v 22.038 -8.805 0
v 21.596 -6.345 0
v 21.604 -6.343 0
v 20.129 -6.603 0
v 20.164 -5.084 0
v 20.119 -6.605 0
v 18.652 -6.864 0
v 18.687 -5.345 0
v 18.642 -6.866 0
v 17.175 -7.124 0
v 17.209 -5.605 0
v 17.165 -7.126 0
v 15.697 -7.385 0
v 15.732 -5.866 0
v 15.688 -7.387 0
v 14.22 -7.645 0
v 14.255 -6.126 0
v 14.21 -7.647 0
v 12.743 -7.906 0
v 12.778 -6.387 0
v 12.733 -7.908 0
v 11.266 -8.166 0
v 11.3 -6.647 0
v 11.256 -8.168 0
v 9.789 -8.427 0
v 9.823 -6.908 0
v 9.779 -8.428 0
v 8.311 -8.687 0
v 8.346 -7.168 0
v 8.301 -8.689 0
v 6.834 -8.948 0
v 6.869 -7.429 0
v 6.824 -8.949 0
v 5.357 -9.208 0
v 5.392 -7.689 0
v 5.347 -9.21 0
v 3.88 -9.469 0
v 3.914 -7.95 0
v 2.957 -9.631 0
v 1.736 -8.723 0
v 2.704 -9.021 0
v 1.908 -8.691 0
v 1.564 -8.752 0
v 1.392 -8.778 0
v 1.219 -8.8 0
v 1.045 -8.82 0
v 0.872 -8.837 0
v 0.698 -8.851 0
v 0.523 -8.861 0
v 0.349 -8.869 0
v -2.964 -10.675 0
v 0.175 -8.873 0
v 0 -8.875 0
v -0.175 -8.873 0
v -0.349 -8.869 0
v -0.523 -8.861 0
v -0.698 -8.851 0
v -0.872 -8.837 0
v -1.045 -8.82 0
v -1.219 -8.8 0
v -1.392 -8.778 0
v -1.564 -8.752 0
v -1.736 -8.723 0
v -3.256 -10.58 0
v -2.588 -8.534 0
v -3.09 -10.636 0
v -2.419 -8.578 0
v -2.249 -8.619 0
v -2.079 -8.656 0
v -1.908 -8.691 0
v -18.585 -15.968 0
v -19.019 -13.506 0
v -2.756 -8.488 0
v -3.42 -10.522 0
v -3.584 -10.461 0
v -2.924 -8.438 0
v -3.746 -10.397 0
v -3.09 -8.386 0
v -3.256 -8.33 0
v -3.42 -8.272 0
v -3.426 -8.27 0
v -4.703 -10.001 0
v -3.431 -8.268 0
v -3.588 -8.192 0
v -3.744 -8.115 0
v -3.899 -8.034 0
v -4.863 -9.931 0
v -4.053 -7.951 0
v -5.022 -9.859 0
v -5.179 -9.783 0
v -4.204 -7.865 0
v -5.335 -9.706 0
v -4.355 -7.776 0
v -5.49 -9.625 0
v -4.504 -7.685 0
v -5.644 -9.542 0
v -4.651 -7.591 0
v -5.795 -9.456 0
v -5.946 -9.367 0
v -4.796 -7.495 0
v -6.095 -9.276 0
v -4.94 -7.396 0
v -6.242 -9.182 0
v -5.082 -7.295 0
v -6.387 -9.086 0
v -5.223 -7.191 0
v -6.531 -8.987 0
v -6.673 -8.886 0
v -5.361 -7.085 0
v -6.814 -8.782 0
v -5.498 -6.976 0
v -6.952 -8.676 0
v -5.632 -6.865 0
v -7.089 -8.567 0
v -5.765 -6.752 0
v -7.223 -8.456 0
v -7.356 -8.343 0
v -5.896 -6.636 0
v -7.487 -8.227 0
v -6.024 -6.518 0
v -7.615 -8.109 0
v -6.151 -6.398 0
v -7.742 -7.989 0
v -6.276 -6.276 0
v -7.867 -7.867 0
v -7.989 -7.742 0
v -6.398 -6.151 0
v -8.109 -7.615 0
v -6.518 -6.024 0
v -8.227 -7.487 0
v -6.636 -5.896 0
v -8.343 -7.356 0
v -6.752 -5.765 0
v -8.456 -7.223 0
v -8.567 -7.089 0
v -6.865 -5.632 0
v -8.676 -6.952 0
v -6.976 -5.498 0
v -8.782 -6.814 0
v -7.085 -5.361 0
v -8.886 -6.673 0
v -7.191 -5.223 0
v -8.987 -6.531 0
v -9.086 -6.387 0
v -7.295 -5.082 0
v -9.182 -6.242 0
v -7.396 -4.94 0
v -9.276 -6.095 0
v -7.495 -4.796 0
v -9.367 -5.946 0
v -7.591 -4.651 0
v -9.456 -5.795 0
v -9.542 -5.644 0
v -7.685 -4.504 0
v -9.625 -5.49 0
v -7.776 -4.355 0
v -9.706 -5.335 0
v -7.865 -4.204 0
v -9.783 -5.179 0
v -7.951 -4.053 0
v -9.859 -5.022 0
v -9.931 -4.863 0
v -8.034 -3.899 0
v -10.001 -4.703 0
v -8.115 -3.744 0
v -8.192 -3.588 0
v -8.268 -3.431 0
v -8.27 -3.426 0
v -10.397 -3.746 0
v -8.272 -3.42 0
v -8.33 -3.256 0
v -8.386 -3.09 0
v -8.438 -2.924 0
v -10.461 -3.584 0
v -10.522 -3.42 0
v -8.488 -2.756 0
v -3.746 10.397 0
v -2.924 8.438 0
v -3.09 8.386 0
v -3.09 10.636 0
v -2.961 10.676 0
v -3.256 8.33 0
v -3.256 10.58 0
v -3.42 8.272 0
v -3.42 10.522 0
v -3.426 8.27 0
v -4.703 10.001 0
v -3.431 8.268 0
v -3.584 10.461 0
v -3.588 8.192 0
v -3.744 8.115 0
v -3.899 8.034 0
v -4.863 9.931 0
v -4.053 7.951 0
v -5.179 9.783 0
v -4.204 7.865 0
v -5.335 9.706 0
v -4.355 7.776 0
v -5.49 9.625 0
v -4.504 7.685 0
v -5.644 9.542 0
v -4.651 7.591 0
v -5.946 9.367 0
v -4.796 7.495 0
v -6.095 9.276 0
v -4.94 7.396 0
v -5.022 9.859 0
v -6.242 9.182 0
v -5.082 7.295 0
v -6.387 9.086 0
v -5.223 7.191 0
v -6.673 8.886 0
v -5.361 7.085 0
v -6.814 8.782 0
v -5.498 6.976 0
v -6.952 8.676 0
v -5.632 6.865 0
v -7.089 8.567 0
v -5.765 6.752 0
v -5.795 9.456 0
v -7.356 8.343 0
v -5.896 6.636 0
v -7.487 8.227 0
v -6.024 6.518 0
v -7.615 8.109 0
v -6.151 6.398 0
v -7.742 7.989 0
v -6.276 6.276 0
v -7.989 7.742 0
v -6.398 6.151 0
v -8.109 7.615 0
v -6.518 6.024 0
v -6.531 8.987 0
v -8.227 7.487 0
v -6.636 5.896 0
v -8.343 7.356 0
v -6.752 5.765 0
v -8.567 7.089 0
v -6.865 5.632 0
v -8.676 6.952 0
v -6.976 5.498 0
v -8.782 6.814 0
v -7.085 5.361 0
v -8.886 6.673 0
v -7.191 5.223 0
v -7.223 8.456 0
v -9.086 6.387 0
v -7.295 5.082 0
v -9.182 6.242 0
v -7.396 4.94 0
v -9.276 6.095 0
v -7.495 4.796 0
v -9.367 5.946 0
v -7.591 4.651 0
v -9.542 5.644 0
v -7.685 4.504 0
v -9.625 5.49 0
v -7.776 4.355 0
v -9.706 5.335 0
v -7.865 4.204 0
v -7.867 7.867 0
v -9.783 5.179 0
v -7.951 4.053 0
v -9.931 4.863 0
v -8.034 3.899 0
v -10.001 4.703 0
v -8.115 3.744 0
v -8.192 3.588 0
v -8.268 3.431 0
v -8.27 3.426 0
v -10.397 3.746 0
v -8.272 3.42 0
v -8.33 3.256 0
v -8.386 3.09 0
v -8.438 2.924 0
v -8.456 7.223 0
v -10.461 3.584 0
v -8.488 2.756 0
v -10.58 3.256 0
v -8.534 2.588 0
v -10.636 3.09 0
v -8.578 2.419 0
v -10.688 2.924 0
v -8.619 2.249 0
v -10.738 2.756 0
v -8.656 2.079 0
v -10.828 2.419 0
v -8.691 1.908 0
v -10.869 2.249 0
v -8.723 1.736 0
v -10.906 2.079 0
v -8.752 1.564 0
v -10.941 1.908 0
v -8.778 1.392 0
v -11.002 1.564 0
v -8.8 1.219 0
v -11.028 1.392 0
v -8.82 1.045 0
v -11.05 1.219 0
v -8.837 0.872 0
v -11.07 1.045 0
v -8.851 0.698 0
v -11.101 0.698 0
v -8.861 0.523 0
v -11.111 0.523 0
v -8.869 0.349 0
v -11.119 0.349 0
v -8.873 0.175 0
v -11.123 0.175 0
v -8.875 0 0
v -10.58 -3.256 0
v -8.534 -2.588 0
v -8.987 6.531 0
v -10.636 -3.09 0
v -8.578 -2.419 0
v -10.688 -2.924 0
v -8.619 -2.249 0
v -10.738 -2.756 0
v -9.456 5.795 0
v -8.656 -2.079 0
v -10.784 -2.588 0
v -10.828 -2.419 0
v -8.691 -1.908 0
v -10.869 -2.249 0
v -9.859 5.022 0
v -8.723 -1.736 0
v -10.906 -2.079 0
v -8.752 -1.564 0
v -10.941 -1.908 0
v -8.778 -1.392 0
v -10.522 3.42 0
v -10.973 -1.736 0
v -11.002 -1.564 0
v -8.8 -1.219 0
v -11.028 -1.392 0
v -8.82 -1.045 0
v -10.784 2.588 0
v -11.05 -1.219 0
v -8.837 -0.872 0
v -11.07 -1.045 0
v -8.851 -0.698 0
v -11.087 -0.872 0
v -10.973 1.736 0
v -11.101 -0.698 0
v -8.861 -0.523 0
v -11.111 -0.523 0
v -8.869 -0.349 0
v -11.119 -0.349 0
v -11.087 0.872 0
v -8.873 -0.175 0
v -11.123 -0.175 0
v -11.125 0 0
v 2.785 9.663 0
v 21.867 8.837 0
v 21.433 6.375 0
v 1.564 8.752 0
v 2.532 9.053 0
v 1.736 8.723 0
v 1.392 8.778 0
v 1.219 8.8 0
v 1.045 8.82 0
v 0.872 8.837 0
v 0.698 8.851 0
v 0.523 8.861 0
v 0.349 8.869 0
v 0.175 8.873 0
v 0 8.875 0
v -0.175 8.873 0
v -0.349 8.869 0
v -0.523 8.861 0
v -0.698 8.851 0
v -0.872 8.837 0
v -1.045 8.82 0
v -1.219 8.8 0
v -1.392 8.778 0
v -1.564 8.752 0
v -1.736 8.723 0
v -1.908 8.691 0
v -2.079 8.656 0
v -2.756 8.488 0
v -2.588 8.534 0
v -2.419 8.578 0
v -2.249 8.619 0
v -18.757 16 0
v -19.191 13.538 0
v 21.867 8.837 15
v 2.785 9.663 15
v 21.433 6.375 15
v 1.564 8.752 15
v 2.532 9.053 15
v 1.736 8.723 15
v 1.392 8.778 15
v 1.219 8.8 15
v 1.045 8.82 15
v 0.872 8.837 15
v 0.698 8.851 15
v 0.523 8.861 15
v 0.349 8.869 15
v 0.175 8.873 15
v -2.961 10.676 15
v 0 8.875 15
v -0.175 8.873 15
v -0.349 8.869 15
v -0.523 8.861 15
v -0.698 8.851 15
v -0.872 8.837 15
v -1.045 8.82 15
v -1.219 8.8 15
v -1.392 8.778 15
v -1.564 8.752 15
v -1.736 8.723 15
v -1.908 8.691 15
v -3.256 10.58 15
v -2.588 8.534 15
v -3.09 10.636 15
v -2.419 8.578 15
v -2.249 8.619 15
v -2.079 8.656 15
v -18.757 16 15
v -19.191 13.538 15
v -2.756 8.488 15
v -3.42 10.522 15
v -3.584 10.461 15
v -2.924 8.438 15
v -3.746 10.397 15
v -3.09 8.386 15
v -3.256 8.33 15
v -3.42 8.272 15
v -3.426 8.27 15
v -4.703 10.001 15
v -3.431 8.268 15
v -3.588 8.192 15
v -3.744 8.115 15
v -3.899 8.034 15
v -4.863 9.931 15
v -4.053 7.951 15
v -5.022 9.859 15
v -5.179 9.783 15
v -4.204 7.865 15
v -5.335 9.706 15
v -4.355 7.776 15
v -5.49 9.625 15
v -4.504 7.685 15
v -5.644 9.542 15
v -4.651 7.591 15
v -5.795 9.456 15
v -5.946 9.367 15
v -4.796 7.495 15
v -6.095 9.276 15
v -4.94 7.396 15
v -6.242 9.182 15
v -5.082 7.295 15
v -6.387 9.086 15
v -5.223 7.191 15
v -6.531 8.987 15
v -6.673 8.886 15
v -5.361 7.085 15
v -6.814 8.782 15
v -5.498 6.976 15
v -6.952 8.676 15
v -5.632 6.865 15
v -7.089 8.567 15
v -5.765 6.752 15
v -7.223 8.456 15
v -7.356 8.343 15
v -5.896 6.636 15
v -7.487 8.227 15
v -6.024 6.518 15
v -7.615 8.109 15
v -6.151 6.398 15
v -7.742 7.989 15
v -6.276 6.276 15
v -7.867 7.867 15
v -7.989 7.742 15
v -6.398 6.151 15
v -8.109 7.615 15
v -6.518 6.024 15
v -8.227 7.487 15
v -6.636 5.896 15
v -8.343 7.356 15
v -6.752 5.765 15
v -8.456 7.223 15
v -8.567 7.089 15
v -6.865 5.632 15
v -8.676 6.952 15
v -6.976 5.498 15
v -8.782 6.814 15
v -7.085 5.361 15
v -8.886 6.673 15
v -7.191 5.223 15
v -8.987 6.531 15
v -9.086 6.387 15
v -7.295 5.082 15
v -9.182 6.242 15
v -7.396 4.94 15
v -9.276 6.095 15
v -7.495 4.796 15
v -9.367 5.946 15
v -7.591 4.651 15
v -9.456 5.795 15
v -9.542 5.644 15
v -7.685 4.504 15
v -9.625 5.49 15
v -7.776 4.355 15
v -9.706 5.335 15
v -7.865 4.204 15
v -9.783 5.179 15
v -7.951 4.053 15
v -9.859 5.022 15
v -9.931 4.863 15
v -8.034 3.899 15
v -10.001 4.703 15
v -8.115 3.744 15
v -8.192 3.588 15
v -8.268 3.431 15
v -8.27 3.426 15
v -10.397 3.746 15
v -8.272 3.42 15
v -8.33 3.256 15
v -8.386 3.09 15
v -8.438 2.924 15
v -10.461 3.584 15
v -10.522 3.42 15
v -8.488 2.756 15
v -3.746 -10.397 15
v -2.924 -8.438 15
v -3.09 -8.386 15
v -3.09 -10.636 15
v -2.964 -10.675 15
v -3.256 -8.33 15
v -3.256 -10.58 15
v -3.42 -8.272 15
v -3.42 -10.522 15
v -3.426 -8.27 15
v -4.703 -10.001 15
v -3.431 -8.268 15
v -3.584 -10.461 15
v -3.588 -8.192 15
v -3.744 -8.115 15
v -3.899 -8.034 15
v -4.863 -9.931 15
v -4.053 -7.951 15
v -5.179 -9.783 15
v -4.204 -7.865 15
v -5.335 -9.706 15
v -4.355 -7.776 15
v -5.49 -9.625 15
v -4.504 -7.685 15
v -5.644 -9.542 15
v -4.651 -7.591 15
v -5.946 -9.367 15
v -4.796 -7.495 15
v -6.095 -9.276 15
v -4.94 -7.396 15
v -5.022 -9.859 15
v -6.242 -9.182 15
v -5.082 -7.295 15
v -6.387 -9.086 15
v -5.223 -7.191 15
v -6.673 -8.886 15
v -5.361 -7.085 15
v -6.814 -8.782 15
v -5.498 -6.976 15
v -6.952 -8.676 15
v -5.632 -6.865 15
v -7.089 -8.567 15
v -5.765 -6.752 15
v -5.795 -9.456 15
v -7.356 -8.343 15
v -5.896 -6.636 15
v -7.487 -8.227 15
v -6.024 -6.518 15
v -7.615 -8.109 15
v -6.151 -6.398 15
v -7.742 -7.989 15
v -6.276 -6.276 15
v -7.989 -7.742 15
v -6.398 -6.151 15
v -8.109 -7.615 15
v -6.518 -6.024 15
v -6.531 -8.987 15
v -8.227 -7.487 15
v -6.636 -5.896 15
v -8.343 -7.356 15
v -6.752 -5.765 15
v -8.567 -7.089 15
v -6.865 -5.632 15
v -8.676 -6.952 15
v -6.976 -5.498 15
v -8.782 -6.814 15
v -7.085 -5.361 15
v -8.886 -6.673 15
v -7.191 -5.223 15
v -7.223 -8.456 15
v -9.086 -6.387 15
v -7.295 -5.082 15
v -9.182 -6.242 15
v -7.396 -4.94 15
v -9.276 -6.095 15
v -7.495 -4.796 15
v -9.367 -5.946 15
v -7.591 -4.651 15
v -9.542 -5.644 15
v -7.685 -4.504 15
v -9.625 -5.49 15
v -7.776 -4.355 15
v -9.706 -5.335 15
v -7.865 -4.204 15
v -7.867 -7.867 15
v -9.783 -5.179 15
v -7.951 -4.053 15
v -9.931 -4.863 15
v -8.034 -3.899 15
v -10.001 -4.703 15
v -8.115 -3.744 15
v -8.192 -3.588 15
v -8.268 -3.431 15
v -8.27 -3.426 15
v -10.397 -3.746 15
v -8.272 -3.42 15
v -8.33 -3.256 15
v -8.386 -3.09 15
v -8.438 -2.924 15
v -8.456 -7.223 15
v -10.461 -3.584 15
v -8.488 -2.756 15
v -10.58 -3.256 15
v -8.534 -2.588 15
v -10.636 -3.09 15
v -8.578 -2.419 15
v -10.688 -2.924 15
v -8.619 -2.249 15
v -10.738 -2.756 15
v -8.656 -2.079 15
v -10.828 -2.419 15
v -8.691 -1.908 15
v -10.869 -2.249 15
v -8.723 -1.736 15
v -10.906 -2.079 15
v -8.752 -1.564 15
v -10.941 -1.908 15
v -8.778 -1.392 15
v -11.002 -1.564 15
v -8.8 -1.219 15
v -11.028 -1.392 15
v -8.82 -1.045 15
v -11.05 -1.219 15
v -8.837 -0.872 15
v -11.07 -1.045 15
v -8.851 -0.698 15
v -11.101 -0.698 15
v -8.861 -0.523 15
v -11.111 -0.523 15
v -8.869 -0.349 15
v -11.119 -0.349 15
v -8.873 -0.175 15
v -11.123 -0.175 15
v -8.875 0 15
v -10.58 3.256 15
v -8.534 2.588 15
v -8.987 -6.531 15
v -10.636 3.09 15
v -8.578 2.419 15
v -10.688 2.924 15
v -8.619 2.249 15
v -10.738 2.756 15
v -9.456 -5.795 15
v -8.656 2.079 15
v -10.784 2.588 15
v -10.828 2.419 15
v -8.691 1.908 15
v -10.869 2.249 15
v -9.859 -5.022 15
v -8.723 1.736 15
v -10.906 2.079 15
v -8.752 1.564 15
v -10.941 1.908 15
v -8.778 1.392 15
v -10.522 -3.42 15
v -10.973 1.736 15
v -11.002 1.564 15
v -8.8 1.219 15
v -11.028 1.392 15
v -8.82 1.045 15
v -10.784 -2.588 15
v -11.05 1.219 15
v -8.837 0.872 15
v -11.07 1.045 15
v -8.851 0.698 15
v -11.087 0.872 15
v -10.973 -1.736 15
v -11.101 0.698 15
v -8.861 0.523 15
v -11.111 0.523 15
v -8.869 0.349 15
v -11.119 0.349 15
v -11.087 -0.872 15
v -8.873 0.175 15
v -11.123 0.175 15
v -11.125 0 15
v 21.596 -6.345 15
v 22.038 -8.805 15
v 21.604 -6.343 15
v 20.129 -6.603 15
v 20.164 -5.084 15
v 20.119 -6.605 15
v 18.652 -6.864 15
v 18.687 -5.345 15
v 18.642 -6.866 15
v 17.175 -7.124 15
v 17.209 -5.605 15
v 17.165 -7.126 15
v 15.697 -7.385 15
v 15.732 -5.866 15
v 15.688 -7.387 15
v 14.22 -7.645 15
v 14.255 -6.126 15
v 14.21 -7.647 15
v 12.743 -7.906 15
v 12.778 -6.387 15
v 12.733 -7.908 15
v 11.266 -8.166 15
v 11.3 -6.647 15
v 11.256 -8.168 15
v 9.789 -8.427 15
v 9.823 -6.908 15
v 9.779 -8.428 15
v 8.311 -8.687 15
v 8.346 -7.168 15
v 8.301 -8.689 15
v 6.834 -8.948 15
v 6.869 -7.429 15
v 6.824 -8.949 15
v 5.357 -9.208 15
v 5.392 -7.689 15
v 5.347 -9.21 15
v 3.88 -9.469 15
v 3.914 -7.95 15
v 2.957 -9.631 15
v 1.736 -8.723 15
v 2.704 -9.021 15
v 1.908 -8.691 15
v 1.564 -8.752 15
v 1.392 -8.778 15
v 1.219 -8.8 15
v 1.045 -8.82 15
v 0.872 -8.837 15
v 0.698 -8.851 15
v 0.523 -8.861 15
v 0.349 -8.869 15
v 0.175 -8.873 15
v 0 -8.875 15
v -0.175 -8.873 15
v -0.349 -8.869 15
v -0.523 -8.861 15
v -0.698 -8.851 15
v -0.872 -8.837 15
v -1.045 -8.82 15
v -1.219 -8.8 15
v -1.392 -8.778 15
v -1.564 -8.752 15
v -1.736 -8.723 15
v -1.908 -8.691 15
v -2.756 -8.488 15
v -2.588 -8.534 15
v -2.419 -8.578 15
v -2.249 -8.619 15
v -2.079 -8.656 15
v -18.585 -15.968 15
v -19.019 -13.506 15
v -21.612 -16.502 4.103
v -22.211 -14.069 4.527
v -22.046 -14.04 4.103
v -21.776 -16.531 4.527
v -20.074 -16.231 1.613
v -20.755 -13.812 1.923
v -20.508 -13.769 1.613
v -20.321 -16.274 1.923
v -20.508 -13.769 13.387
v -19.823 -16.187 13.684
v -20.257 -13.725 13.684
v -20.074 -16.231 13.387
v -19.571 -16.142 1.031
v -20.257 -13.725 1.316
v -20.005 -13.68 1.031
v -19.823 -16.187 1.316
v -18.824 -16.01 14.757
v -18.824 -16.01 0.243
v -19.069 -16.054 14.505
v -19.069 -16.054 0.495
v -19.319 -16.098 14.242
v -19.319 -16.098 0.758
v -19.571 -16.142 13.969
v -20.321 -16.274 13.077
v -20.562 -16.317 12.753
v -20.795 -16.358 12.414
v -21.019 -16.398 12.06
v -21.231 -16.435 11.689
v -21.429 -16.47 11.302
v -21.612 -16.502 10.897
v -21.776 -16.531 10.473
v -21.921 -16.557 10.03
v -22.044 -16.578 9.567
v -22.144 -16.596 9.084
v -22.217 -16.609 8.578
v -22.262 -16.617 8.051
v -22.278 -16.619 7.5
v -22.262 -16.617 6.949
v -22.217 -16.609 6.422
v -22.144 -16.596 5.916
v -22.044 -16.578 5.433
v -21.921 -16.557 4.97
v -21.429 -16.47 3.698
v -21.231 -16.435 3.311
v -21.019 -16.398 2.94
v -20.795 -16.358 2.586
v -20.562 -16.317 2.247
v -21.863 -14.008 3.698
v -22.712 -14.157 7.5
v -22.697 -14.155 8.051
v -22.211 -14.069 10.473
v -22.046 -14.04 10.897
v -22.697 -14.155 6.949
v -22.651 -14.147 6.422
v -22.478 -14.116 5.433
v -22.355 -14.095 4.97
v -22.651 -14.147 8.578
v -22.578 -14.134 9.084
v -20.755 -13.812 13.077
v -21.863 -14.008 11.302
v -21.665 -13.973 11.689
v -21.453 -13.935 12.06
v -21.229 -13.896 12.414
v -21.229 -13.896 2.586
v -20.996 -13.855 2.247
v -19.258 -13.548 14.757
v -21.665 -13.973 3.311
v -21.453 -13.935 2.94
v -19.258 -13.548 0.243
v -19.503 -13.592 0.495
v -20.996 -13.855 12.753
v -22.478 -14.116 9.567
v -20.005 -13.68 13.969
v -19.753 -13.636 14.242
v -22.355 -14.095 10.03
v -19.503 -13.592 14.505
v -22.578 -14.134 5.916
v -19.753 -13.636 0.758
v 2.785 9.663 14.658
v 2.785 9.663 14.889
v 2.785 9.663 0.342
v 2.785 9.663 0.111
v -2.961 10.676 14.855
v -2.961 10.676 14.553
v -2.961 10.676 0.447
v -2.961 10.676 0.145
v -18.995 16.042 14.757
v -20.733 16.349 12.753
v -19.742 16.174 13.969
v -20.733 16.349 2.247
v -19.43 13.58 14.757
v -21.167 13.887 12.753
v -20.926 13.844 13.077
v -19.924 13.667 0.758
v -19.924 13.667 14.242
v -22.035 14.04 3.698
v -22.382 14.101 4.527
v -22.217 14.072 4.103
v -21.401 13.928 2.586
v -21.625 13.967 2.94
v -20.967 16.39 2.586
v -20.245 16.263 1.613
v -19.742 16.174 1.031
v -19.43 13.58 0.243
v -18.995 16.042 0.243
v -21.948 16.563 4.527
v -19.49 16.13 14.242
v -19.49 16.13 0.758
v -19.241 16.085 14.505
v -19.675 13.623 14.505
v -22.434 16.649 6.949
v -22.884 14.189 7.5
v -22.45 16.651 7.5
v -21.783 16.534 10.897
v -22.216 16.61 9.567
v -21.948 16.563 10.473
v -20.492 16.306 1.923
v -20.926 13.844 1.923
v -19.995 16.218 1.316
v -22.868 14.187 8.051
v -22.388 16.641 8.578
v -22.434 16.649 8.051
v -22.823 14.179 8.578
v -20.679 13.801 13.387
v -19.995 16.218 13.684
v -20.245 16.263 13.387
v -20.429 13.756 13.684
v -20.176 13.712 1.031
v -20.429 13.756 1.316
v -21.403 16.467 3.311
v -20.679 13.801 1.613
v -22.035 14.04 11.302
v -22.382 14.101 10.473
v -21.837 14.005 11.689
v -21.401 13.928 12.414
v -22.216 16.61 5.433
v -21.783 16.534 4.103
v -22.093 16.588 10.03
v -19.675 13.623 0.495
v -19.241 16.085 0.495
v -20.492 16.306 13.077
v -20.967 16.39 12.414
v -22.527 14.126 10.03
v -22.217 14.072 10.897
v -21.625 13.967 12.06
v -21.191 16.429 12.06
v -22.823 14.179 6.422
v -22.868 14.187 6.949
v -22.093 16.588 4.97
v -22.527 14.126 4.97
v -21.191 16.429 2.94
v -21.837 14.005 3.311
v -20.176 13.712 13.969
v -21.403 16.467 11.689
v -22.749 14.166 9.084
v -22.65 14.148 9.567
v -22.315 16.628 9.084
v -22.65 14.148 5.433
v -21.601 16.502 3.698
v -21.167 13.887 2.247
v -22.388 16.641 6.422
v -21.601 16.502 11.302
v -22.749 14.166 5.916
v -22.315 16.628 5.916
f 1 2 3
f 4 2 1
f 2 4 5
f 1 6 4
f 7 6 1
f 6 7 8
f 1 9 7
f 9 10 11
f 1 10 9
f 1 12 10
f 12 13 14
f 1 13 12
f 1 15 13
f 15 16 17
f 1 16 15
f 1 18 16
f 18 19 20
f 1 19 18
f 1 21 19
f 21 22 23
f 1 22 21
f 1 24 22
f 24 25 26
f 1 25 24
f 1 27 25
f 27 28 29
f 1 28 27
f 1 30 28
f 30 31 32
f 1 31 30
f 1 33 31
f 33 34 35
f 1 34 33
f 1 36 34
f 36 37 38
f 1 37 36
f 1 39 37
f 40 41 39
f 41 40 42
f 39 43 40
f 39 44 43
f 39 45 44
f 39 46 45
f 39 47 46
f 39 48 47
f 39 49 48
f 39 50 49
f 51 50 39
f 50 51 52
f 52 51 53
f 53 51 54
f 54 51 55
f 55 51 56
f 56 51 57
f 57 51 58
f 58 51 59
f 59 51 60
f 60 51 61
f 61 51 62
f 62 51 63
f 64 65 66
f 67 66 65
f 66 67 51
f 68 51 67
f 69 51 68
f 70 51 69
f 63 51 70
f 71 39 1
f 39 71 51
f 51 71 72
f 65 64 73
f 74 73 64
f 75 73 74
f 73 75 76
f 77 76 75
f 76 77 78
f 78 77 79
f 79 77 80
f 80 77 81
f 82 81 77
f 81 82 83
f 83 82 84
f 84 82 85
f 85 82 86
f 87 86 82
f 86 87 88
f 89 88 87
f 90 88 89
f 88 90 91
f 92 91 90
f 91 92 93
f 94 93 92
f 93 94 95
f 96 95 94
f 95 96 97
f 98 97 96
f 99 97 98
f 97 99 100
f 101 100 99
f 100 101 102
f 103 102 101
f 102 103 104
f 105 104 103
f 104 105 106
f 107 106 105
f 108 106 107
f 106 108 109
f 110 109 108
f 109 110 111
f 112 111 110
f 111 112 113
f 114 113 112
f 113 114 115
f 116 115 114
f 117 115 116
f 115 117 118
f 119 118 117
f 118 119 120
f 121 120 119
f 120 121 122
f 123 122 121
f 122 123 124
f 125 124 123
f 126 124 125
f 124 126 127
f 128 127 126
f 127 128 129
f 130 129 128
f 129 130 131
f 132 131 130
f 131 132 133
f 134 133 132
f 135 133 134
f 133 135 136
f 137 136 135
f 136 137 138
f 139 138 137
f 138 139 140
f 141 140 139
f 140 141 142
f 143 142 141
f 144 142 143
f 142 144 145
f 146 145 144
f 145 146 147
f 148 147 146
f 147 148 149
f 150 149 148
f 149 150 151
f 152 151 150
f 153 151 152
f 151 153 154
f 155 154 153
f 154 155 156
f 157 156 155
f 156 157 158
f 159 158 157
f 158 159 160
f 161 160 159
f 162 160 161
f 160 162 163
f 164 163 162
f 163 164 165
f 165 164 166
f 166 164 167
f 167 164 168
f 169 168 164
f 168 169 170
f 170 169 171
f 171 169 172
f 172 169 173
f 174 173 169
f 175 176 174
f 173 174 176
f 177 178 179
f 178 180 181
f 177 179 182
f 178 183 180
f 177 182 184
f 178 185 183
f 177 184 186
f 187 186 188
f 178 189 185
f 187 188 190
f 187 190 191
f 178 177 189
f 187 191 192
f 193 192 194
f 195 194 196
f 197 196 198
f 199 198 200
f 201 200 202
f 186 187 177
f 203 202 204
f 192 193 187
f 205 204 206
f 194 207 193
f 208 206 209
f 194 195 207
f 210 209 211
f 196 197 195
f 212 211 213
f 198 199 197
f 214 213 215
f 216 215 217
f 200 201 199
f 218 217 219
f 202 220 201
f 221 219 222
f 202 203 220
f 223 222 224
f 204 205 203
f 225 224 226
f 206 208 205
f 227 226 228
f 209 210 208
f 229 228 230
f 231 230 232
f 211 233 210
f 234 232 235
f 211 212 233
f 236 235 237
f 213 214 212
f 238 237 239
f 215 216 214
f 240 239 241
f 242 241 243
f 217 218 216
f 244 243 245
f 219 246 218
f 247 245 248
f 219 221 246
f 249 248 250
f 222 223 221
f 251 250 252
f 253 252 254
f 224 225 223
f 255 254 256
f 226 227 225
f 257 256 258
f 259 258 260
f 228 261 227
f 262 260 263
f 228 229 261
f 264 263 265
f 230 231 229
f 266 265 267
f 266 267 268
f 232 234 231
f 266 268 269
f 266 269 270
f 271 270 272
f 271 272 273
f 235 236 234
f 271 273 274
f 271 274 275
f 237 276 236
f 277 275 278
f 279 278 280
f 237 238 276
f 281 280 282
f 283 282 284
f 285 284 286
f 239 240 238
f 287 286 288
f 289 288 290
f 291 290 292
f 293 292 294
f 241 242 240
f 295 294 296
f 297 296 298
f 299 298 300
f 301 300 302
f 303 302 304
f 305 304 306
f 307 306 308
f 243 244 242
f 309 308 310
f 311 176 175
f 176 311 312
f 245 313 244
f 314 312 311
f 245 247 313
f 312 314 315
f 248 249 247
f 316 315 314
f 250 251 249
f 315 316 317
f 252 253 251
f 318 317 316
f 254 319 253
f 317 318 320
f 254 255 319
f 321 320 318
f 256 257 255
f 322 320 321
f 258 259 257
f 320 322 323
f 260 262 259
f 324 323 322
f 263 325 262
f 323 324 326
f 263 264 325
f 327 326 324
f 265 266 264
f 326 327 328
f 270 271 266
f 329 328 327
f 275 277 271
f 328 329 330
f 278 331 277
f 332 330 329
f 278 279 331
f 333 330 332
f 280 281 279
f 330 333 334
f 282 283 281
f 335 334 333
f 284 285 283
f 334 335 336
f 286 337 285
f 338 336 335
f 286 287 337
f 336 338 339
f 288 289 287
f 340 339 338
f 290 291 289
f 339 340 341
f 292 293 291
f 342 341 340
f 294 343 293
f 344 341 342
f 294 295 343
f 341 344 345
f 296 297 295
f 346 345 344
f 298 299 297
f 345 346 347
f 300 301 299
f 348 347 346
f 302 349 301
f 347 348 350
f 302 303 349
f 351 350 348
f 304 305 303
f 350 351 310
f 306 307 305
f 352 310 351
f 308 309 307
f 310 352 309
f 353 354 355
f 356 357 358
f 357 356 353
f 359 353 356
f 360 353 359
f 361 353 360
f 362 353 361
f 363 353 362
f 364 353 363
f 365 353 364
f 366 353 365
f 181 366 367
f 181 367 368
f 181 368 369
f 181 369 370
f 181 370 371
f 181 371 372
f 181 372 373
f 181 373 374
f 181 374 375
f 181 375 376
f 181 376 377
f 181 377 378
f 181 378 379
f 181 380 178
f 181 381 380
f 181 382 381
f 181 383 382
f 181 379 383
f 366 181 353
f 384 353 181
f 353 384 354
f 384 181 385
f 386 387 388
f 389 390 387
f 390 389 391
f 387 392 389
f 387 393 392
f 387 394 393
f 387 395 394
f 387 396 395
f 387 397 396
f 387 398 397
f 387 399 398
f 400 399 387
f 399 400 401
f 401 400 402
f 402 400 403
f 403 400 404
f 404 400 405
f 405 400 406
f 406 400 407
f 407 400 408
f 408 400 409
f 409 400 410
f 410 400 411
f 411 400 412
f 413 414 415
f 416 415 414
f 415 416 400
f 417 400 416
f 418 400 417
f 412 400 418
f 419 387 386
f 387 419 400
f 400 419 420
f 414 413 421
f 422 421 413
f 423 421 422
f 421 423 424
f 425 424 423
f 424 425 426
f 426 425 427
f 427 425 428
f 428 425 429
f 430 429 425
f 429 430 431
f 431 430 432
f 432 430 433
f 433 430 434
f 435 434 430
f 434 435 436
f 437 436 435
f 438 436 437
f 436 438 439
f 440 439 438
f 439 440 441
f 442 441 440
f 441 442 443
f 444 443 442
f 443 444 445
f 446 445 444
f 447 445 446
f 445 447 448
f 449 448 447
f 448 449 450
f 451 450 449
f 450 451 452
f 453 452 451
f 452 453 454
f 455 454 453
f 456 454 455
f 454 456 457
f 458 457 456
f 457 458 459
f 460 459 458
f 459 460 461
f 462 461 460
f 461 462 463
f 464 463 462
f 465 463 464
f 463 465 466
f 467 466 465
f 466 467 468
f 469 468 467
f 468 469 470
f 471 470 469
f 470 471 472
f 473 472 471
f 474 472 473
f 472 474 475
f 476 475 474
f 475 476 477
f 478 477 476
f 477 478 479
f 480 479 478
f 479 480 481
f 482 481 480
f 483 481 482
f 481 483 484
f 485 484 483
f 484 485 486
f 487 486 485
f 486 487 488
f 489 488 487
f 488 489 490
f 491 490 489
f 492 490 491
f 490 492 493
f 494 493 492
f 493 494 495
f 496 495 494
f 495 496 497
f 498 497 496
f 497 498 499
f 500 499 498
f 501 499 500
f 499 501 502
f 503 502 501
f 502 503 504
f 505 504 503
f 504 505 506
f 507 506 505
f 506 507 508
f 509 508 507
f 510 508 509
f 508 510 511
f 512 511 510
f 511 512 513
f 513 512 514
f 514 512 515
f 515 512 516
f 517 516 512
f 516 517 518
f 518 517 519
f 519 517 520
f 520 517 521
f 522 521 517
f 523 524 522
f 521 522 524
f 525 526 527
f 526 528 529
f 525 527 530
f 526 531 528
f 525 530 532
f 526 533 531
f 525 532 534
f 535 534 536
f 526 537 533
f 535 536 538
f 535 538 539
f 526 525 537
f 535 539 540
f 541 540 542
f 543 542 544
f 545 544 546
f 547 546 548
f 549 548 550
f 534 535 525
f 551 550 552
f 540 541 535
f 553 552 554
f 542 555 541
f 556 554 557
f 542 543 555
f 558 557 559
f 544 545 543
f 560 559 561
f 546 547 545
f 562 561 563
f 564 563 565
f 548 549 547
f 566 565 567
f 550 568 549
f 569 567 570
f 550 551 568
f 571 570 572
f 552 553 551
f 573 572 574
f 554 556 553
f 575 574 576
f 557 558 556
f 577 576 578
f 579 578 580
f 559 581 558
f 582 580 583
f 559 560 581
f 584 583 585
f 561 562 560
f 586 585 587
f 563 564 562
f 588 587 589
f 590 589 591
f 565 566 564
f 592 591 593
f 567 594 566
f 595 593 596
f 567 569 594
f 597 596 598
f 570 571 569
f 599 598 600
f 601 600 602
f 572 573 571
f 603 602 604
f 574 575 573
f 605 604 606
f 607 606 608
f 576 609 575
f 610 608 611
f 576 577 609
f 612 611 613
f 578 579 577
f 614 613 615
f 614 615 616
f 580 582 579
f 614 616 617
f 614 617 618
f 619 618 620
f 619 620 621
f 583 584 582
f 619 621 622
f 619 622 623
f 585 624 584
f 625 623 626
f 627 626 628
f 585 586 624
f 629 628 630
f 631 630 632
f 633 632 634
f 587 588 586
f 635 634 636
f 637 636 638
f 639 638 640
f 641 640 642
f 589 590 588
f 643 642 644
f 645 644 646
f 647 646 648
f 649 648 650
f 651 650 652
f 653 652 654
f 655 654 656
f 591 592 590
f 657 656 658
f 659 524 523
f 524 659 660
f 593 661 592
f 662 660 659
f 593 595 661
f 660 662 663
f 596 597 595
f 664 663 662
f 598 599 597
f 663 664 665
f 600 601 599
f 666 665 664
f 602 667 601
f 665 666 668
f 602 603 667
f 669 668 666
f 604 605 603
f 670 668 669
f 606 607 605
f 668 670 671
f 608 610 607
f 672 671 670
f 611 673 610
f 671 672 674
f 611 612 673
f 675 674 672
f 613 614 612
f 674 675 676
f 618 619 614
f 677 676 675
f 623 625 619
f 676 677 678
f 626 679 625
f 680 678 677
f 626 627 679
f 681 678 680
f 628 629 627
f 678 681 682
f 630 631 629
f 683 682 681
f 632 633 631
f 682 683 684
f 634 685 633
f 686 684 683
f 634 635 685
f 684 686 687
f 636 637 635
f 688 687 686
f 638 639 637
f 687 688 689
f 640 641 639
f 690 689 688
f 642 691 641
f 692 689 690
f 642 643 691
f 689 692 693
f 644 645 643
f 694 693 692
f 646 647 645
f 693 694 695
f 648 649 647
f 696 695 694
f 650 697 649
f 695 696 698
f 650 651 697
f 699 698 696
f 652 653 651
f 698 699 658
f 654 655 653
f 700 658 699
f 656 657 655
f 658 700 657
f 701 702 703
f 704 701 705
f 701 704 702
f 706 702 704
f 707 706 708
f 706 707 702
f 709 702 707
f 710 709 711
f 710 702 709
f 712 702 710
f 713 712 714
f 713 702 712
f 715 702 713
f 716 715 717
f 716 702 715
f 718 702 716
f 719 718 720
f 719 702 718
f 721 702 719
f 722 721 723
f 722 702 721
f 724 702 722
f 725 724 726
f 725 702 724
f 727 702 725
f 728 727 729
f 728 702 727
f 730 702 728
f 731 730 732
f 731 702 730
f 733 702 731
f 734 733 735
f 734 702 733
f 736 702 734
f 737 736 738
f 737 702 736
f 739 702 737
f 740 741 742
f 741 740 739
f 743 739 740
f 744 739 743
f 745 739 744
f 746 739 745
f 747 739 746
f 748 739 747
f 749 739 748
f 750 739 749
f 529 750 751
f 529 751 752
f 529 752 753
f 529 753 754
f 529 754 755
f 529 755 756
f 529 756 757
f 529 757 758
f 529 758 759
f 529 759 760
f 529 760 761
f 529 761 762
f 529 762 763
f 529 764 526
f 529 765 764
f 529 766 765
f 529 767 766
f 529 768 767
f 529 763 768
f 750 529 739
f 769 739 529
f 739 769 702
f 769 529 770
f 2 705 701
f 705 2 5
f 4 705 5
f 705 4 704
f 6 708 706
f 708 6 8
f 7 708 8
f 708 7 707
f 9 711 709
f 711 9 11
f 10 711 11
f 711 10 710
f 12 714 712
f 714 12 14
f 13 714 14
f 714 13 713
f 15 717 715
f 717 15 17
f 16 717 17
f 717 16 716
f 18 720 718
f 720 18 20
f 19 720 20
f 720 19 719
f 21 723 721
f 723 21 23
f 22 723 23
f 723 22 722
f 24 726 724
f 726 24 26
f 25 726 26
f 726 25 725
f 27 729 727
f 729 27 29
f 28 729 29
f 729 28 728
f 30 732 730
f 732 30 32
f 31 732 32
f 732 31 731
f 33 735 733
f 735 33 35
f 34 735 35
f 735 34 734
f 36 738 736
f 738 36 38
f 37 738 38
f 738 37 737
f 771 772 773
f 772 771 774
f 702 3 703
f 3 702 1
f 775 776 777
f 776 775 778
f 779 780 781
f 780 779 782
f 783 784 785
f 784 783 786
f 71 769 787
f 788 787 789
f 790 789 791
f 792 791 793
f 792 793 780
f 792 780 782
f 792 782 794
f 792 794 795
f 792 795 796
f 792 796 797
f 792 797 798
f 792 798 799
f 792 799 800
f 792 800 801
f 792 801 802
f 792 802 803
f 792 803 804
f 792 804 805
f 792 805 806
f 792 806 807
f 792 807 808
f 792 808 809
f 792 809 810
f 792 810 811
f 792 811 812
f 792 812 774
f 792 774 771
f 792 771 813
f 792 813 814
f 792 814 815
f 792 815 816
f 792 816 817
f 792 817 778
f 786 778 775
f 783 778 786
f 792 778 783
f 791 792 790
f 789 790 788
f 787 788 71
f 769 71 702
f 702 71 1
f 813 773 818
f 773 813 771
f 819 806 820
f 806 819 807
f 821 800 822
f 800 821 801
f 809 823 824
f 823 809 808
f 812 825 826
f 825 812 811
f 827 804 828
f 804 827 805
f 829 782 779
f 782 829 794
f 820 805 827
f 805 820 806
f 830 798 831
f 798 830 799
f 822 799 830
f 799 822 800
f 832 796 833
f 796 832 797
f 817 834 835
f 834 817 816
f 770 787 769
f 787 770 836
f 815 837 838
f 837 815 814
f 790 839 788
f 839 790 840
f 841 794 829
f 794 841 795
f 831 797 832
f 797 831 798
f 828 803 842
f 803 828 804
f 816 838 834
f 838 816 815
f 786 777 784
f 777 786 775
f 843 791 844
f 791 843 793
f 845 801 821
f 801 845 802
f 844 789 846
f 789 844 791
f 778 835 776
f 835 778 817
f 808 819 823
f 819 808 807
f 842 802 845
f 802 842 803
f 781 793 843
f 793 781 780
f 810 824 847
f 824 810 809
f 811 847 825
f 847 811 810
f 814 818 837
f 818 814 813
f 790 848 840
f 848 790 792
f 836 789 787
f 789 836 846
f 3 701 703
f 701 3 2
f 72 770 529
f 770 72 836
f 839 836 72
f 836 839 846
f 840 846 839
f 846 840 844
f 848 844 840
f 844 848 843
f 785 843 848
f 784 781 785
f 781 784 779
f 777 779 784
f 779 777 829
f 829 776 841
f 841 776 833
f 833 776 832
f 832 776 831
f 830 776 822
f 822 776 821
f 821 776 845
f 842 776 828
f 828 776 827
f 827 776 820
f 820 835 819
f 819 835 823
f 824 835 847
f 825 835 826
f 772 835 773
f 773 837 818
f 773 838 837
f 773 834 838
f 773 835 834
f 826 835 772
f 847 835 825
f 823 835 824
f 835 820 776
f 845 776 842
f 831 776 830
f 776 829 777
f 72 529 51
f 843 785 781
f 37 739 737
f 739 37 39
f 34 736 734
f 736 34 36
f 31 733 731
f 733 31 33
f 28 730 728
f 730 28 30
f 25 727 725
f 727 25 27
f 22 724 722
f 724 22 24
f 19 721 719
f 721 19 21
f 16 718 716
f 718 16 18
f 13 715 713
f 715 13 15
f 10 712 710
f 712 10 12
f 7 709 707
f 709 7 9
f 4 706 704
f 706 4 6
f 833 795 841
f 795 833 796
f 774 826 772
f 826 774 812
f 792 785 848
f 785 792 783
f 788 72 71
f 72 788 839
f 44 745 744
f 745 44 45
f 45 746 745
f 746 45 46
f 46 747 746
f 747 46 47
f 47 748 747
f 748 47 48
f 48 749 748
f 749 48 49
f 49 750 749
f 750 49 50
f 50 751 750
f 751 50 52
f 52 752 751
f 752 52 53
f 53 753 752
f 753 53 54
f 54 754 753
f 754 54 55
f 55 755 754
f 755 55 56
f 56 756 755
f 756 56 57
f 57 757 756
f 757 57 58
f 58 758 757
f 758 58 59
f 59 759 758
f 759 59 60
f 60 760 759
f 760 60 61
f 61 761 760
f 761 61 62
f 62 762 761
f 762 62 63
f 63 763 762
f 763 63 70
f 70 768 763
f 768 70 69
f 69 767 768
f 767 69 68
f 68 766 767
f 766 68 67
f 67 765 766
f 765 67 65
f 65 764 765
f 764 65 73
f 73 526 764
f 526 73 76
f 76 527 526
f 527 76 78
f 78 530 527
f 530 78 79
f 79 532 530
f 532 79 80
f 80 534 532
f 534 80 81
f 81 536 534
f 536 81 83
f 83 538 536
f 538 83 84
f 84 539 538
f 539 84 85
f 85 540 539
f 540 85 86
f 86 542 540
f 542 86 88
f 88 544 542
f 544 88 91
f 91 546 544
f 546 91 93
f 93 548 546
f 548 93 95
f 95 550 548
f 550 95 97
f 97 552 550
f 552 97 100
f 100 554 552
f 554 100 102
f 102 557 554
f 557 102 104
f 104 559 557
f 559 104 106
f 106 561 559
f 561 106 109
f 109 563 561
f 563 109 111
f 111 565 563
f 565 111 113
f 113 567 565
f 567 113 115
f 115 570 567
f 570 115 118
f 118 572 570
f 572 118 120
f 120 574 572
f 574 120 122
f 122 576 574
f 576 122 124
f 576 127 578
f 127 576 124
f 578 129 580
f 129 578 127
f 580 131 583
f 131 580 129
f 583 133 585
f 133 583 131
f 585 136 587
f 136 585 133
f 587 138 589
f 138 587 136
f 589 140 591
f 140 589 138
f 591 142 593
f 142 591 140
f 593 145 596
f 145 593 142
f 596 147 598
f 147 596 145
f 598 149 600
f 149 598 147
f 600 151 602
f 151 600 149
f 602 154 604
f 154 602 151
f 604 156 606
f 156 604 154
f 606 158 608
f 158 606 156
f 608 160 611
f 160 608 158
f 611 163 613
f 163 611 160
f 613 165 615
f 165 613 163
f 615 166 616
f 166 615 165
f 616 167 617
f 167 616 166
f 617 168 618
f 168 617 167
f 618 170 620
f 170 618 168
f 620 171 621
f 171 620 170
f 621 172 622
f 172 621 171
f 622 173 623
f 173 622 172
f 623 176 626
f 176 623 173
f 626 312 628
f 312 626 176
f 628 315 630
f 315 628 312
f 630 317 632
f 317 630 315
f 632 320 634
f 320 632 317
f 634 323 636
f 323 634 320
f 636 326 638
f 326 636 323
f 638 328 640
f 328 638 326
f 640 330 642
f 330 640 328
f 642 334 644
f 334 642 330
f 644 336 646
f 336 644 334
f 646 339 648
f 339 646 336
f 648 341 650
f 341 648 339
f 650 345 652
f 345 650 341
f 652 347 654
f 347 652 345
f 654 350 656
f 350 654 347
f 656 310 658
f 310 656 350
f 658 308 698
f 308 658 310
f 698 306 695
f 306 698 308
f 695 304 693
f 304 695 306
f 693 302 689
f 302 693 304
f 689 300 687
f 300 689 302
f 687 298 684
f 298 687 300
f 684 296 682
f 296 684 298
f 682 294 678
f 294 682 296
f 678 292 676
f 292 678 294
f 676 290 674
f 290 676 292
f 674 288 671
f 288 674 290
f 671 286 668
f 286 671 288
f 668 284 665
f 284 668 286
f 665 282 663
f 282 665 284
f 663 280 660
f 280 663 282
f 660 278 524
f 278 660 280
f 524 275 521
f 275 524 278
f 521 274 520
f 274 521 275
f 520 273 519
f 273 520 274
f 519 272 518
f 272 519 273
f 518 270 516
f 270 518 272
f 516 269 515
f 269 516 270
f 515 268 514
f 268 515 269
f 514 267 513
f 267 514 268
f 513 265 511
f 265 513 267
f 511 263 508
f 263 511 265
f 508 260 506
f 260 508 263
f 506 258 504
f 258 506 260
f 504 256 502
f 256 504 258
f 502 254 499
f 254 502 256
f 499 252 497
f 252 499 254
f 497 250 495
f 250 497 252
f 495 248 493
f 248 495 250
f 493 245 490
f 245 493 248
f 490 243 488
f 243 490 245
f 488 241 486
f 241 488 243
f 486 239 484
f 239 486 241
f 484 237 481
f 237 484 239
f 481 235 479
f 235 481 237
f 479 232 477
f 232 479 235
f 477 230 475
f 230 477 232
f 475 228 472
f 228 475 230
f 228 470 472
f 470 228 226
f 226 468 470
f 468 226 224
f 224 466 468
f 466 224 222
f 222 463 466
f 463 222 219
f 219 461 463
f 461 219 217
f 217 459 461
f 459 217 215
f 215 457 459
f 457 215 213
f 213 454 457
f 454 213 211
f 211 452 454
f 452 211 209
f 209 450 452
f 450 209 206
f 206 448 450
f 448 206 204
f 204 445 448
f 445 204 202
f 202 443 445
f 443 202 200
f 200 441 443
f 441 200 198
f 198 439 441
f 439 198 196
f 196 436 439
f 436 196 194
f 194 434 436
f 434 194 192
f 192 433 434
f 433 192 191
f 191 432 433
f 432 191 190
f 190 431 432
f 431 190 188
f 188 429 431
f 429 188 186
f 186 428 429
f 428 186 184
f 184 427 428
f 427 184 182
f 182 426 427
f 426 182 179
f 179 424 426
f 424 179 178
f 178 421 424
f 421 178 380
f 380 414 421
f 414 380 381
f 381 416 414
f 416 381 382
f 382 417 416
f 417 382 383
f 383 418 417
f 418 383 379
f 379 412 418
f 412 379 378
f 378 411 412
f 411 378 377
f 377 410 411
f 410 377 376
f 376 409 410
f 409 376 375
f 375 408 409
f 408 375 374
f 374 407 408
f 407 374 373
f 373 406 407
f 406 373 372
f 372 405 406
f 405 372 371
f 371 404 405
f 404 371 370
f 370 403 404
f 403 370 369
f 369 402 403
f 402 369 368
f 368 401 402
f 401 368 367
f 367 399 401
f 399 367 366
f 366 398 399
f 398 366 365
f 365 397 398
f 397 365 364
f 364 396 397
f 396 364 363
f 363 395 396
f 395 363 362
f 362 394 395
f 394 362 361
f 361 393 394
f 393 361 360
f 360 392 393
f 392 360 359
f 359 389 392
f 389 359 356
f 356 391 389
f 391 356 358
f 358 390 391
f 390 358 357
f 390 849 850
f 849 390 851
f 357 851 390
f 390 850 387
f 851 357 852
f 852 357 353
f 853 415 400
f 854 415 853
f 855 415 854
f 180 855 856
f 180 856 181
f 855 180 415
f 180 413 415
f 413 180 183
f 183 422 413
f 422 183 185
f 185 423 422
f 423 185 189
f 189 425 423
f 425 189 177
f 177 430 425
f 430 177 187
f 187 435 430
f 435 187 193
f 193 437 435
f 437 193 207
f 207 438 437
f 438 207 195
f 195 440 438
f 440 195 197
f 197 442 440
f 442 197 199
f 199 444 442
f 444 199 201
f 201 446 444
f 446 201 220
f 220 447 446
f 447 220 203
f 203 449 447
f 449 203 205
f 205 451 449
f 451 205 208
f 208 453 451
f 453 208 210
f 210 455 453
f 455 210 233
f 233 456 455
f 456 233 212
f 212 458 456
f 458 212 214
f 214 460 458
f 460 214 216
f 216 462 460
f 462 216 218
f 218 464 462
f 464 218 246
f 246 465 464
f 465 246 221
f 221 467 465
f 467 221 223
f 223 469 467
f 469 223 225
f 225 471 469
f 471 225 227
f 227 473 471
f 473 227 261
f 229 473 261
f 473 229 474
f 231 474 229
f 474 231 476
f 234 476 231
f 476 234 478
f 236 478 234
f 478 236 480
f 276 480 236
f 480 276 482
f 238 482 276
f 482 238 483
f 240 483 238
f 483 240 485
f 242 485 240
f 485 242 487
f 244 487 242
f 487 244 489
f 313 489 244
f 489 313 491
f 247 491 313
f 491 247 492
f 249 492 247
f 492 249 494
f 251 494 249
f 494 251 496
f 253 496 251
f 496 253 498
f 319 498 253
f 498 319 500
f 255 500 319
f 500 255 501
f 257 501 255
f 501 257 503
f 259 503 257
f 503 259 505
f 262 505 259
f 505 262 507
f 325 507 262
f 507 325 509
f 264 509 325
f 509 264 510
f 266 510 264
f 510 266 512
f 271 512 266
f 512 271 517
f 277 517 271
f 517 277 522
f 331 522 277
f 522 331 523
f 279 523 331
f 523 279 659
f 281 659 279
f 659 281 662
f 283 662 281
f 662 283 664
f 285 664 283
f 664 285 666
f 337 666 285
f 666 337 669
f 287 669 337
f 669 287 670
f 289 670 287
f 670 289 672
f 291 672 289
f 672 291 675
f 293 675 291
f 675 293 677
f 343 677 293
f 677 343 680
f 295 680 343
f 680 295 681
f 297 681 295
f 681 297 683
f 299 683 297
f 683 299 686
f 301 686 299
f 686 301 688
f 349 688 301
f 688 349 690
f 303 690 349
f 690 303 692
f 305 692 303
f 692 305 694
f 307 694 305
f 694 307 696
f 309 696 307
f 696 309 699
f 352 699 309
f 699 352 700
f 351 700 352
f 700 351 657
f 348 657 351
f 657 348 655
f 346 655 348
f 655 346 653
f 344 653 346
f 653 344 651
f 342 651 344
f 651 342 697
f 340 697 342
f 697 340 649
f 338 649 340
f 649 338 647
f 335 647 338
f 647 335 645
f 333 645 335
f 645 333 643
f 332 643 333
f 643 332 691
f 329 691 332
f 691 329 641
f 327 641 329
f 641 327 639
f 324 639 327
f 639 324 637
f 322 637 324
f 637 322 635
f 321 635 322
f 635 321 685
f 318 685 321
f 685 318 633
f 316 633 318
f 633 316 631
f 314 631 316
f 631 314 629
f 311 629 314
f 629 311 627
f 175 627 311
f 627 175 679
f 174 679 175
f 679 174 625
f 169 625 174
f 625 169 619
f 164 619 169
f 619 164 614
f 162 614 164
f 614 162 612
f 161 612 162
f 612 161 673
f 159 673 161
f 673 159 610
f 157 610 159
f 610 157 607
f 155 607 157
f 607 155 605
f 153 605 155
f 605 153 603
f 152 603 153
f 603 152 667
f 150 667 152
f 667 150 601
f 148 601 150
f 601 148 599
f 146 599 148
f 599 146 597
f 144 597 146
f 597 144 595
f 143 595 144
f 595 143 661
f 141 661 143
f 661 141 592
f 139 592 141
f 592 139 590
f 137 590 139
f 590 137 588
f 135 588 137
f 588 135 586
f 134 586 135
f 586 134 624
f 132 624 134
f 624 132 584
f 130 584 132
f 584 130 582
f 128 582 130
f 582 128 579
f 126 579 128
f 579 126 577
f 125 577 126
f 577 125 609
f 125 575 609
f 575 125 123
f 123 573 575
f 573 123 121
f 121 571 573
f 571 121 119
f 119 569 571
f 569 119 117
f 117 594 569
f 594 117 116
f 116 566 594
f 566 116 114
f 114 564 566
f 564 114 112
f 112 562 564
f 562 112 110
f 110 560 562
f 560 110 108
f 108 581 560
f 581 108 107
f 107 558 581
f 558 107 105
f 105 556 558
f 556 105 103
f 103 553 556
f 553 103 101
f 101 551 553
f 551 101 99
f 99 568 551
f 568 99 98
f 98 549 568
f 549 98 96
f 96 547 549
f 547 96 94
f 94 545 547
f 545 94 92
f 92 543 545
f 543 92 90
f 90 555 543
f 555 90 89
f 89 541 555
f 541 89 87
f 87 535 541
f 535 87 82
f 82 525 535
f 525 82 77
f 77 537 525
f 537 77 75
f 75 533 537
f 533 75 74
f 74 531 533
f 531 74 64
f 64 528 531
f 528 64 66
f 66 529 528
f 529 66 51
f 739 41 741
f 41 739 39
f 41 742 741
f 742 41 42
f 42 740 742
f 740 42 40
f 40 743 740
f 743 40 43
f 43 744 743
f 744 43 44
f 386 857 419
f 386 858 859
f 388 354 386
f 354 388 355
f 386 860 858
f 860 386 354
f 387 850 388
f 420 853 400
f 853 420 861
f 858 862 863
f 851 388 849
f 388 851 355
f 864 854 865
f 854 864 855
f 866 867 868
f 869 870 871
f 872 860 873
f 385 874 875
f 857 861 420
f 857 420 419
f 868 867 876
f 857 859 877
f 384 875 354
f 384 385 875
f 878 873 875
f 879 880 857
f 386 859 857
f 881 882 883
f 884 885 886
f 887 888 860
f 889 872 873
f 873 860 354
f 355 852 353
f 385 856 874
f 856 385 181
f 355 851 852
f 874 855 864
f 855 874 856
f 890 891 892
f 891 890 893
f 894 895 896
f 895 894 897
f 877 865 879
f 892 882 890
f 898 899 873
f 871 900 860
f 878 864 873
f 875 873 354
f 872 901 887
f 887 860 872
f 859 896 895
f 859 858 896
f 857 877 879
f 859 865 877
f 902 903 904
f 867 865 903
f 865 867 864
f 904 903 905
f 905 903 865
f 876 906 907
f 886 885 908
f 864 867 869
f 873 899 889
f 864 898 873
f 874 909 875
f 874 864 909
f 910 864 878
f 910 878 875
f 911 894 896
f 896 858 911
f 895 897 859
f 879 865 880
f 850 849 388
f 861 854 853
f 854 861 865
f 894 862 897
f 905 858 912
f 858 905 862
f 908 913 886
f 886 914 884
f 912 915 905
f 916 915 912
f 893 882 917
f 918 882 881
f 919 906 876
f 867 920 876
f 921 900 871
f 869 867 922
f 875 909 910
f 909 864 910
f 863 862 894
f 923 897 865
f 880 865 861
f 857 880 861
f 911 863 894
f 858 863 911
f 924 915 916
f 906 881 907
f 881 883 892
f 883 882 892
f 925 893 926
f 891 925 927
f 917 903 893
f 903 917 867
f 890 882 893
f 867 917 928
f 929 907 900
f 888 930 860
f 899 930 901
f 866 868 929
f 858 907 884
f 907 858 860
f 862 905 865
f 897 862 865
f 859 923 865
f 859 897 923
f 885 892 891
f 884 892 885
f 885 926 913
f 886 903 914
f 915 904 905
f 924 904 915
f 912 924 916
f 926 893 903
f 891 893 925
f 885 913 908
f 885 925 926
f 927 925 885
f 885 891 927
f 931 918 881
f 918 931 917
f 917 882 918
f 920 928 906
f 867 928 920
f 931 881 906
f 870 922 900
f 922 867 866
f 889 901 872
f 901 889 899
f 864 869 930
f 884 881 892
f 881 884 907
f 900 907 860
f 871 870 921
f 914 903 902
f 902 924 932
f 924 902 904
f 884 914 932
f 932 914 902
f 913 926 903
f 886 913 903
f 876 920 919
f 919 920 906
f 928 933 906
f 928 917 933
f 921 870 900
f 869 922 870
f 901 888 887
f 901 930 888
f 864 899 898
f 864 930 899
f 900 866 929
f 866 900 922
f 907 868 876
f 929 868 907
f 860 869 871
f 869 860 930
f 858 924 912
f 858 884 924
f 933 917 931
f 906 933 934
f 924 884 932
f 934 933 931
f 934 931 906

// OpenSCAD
width = 15;
spacing = 20;
restAngle = 20;
jawLength = 20;
handleLength = 25;
jawThickness = 2.5;
bottomTeethOffset = 1;
bottomToothHeight = 1.5;
bottomToothWidth = 1.5;
// 0.5 for symmetric teeth
bottomToothSet = 0.2;
topTeethOffset = 1;
topToothHeight = 0;
// 0.5 for symmetric teeth
topToothWidth = 1.5;
topToothSet = 0.3;
springThickness = 2.25;

module end_of_parameters_dummy() {}


//BEGIN: use <Bezier.scad>;
/*
Copyright (c) 2017 Alexander R. Pruss.

Licensed under any Creative Commons Attribution license you like or under the
following MIT License.

Permission is hereby granted, free of charge, to any person obtaining a copy
of this software and associated documentation files (the "Software"), to deal
in the Software without restriction, including without limitation the rights
to use, copy, modify, merge, publish, distribute, sublicense, and/or sell
copies of the Software, and to permit persons to whom the Software is
furnished to do so, subject to the following conditions:

The above copyright notice and this permission notice shall be included in all
copies or substantial portions of the Software.

THE SOFTWARE IS PROVIDED "AS IS", WITHOUT WARRANTY OF ANY KIND, EXPRESS OR
IMPLIED, INCLUDING BUT NOT LIMITED TO THE WARRANTIES OF MERCHANTABILITY,
FITNESS FOR A PARTICULAR PURPOSE AND NONINFRINGEMENT. IN NO EVENT SHALL THE
AUTHORS OR COPYRIGHT HOLDERS BE LIABLE FOR ANY CLAIM, DAMAGES OR OTHER
LIABILITY, WHETHER IN AN ACTION OF CONTRACT, TORT OR OTHERWISE, ARISING FROM,
OUT OF OR IN CONNECTION WITH THE SOFTWARE OR THE USE OR OTHER DEALINGS IN THE
SOFTWARE.

*/


// Public domain Bezier stuff from www.thingiverse.com/thing:8443
function BEZ03(u) = pow((1-u), 3);
function BEZ13(u) = 3*u*(pow((1-u),2));
function BEZ23(u) = 3*(pow(u,2))*(1-u);
function BEZ33(u) = pow(u,3);
function PointAlongBez4(p0, p1, p2, p3, u) = [for (i=[0:len(p0)-1])
	BEZ03(u)*p0[i]+BEZ13(u)*p1[i]+BEZ23(u)*p2[i]+BEZ33(u)*p3[i]];
// End public domain Bezier stuff

function REPEAT_MIRRORED(v,angleStart=0,angleEnd=360) = ["m",v,angleStart,angleEnd];
function SMOOTH_REL(x) = ["r",x];
function SMOOTH_ABS(x) = ["a",x];
function SYMMETRIC() = ["r",1];
function OFFSET(v) = ["o",v];
function SHARP() = OFFSET([0,0,0]);
function POLAR(r,angle) = OFFSET(r*[cos(angle),sin(angle)]);
function POINT_IS_SPECIAL(v) = (v[0]=="r" || v[0]=="a" || v[0]=="o");

// this does NOT handle offset type points; to handle those, use DecodeBezierOffsets()
function getControlPoint(cp,node,otherCP,otherNode) =
    let(v=node-otherCP)
(cp[0]=="r"?(node+cp[1]*v):( cp[0]=="a"? (
        norm(v)<1e-9 ? node+cp[1]*(node-otherNode)/norm(node-otherNode) : node+cp[1]*v/norm(v) ) :
        cp) );

function onLine2(a,b,c,eps=1e-4) =
    norm(c-a) <= eps ? true
        : norm(b-a) <= eps ? false /* to be safe */
            : abs((c[1]-a[1])*(b[0]-a[0]) - (b[1]-a[1])*(c[0]-a[0])) <= eps * eps && norm(c-a) <= eps + norm(b-a);

function isStraight2(p1,c1,c2,p2,eps=1e-4) =
    len(p1) == 2 &&
    onLine2(p1,p2,c1,eps=eps) && onLine2(p2,p1,c2,eps=eps);

function Bezier2(p,index=0,precision=0.05,rightEndPoint=true,optimize=true) = let(nPoints=
        max(2, precision < 0 ?
                    let(l=norm(p[2]-p[0]))
                    (l==0 ? 2 : l/-precision)
                    : ceil(1/precision)) )
    optimize && isStraight2(p[index],p[index+1],p[index+2],p[index+3]) ? (rightEndPoint?[p[index+0],p[index+3]]:[p[index+0]] ) :
    [for (i=[0:nPoints-(rightEndPoint?0:1)]) PointAlongBez4(p[index+0],p[index+1],p[index+2],p[index+3],i/nPoints)];

function flatten(listOfLists) = [ for(list = listOfLists) for(item = list) item ];


// p is a list of points, in the format:
// [node1,control1,control2,node2,control3, control4,node3, ...]
// You can replace inner control points with:
//   SYMMETRIC: uses a reflection of the control point on the other side of the node
//   SMOOTH_REL(x): like SYMMETRIC, but the distance of the control point to the node is x times the distance of the other control point to the node
//   SMOOTH_ABS(x): like SYMMETRIC, but the distance of the control point to the node is exactly x
// You can also replace any control point with:
//   OFFSET(v): puts the control point at the corresponding node plus the vector v
//   SHARP(): equivalent to OFFSET([0,0]); useful for straight lines
//   POLAR(r,angle): like OFFSET, except the offset is specified in polar coordinates

function DecodeBezierOffset(control,node) = control[0] == "o" ? node+control[1] : control;

function _mirrorMatrix(normalVector) = let(v = normalVector/norm(normalVector)) len(v)<3 ? [[1-2*v[0]*v[0],-2*v[0]*v[1]],[-2*v[0]*v[1],1-2*v[1]*v[1]]] : [[1-2*v[0]*v[0],-2*v[0]*v[1],-2*v[0]*v[2]],[-2*v[0]*v[1],1-2*v[1]*v[1],-2*v[1]*v[2]],[-2*v[0]*v[2],-2*v[1]*v[2],1-2*v[2]*v[2]]];

function _correctLength(p,start=0) =
    start >= len(p) || p[start][0] == "m" ? 3*floor(start/3)+1 : _correctLength(p,start=start+1);

function _trimArray(a, n) = [for (i=[0:n-1]) a[i]];

function _transformPoint(matrix,a) =
    let(n=len(a))
        len(matrix[0])==n+1 ?
            _trimArray(matrix * concat(a,[1]), n)
            : matrix * a;

function _transformPath(matrix,path) =
    [for (a=path) _transformPoint(matrix,a)];

function _reverseArray(array) = let(n=len(array)) [for (i=[0:n-1]) array[n-1-i]];

function _stitchPaths(a,b) = let(na=len(a)) [for (i=[0:na+len(b)-2]) i<na? a[i] : b[i-na+1]-b[0]+a[na-1]];

// replace all OFFSET/SHARP/POLAR points with coordinates
function DecodeBezierOffsets(p) = [for (i=[0:_correctLength(p)-1]) i%3==0?p[i]:(i%3==1?DecodeBezierOffset(p[i],p[i-1]):DecodeBezierOffset(p[i],p[i+1]))];

function _mirrorPaths(basePath, control, start) =
    control[start][0] == "m" ? _mirrorPaths(_stitchPaths(basePath,_reverseArray(_transformPath(_mirrorMatrix( control[start][1] ),basePath))), control, start+1) : basePath;

function DecodeSpecialBezierPoints(p0) =
    let(
        l = _correctLength(p0),
        doMirror = len(p0)>l && p0[l][0] == "m",
        p=DecodeBezierOffsets(p0),
        basePath = [for (i=[0:l-1]) i%3==0?p[i]:(i%3==1?getControlPoint(p[i],p[i-1],p[i-2],p[i-4]):getControlPoint(p[i],p[i+1],p[i+2],p[i+4]))])
        doMirror ? _mirrorPaths(basePath, p0, l) : basePath;

function Distance2D(a,b) = sqrt((a[0]-b[0])*(a[0]-b[0])+(a[1]-b[1])*(a[1]-b[1]));

function RemoveDuplicates(p,eps=0.00001) = let(safeEps = eps/len(p)) [for (i=[0:len(p)-1]) if(i==0 || i==len(p)-1 || Distance2D(p[i-1],p[i]) >= safeEps) p[i]];

function Bezier(p,precision=0.05,eps=0.00001,optimize=true) = let(q=DecodeSpecialBezierPoints(p), nodes=(len(q)-1)/3) RemoveDuplicates(flatten([for (i=[0:nodes-1]) Bezier2(q,optimize=optimize,index=i*3,precision=precision,rightEndPoint=(i==nodes-1))]),eps=eps);

function GetSplineAngle(a,b,c) =
    a==c && b==a ? 0 :
    a==c ? let(ba=b-a) atan2(ba[1],ba[0]) :
    let(ca=c-a) atan2(ca[1],ca[0]);

/*    let(ba=norm(b-a),cb=norm(c-b))
        ba == 0 && cb == 0 ? 0 :
    let(v = ba == 0 ? c-b :
            cb == 0 ? b-a :
            (c-b)*norm(b-a)/norm(c-b)+(b-a))
    atan2(v[1],v[0]); */

// do a spline around b
function SplineAroundPoint(a,b,c,tension=0.5,includeLeftCP=true,includeRightCP=true) =
    includeLeftCP && includeRightCP ?
        [POLAR(tension*norm(a-b),GetSplineAngle(c,b,a)),b,POLAR(tension*norm(c-b),GetSplineAngle(a,b,c))] :
    includeLeftCP ?
        [POLAR(tension*norm(a-b),GetSplineAngle(c,b,a)),b] :
    includeRightCP ?
        [b,POLAR(tension*norm(c-b),GetSplineAngle(a,b,c))] :
        [b];

function BezierSmoothPoints(points,tension=0.5,closed=false)
    = let (n=len(points))
        flatten(
        closed ? [ for (i=[0:n]) SplineAroundPoint(points[(n+i-1)%n],points[i%n],points[(i+1)%n],tension=tension,includeLeftCP=i>0,includeRightCP=i<n) ] :
        [ for (i=[0:n-1])
            SplineAroundPoint(
            i==0 ? 2*points[0]-points[1] : points[(n+i-1)%n],
            points[i],
            i==n-1 ? 2*points[n-1]-points[n-2] : points[(i+1)%n],tension=tension,includeLeftCP=i>0,includeRightCP=i<n-1  ) ]);

module BezierVisualize(p,precision=0.05,eps=0.00001,lineThickness=0.25,controlLineThickness=0.125,nodeSize=1) {
    $fn = 16;
    dim = len(p[0]);
    module point(size) {
        if (dim==2)
            circle(d=size);
        else
            sphere(d=size);
    }
    p1 = DecodeSpecialBezierPoints(p);
    l = Bezier(p1,precision=precision,eps=eps);
    for (i=[0:len(l)-2]) {
        hull() {
            translate(l[i]) point(lineThickness);
            translate(l[i+1]) point(lineThickness);
        }
    }
    for (i=[0:len(p1)-1]) {
        if (i%3 == 0) {
            color("black") translate(p1[i]) point(nodeSize);
        }
        else {
            node = i%3 == 1 ? i-1 : i+1;
            color("red") translate(p1[i]) point(nodeSize);
            color("red") hull() {
                translate(p1[node]) point(controlLineThickness);
                translate(p1[i]) point(controlLineThickness);
            }
        }
    }
}


//END: use <Bezier.scad>;



module dummy(){}

nudge = 0.01;

module ribbon(points, thickness=1, closed=false) {
    p = closed ? concat(points, [points[0]]) : points;

    union() {
        for (i=[1:len(p)-1]) {
            hull() {
                translate(p[i-1]) circle(d=thickness, $fn=8);
                translate(p[i]) circle(d=thickness, $fn=8);
            }
        }
    }
}

module jaw(toothHeight, toothWidth, toothSet, teethOffset) {

    jawProfile = [
        [jawLength+handleLength,-width/2],
        SHARP(),
        SHARP(),
        [0.25*width,-width/2],
        POLAR(0.15*width,135),
        POLAR(0.25*width,-90),
        [0,0],
        REPEAT_MIRRORED([0,-1])];

    translate([-handleLength,-jawThickness]) {

       translate([0,0,width]) rotate([-90,0,0])
        linear_extrude(height=jawThickness)
/*        polygon([[jawLength+handleLength,width],[jawLength+handleLength,0],[0.25*width,0],[0,0.25*width],[0,0.75*width],[0.25*width,width]]); */
        translate([0,width/2])
        polygon(Bezier(jawProfile));
         {
            if (toothHeight > 0) {
               n = floor((jawLength-teethOffset) / toothWidth);
               for (i=[0:n-1]) {
                   x = jawLength+handleLength - (i+1)*toothWidth;
                   translate([0,-nudge])
                   linear_extrude(height=width)
                   polygon([[x,jawThickness],[x+toothWidth*toothSet,jawThickness+toothHeight],[x+toothWidth,jawThickness]]);
               }
            }
        }
    }
}


circleAngle = 90.-restAngle/2.;

springPoints = [for (n=[circleAngle:1:360-circleAngle+1]) (spacing/2)*[cos(n),sin(n)]];

linear_extrude(height=width) {
    ribbon(springPoints, thickness=springThickness);
}

    translate(springPoints[len(springPoints)-1])
    rotate([0,0,restAngle/2.]) jaw(bottomToothHeight, bottomToothWidth, bottomToothSet, bottomTeethOffset);
    translate(springPoints[0]) rotate([0,0,-restAngle/2.]) translate([0,0,width]) rotate([180,0,0]) jaw(topToothHeight, topToothWidth, topToothSet, topTeethOffset);
